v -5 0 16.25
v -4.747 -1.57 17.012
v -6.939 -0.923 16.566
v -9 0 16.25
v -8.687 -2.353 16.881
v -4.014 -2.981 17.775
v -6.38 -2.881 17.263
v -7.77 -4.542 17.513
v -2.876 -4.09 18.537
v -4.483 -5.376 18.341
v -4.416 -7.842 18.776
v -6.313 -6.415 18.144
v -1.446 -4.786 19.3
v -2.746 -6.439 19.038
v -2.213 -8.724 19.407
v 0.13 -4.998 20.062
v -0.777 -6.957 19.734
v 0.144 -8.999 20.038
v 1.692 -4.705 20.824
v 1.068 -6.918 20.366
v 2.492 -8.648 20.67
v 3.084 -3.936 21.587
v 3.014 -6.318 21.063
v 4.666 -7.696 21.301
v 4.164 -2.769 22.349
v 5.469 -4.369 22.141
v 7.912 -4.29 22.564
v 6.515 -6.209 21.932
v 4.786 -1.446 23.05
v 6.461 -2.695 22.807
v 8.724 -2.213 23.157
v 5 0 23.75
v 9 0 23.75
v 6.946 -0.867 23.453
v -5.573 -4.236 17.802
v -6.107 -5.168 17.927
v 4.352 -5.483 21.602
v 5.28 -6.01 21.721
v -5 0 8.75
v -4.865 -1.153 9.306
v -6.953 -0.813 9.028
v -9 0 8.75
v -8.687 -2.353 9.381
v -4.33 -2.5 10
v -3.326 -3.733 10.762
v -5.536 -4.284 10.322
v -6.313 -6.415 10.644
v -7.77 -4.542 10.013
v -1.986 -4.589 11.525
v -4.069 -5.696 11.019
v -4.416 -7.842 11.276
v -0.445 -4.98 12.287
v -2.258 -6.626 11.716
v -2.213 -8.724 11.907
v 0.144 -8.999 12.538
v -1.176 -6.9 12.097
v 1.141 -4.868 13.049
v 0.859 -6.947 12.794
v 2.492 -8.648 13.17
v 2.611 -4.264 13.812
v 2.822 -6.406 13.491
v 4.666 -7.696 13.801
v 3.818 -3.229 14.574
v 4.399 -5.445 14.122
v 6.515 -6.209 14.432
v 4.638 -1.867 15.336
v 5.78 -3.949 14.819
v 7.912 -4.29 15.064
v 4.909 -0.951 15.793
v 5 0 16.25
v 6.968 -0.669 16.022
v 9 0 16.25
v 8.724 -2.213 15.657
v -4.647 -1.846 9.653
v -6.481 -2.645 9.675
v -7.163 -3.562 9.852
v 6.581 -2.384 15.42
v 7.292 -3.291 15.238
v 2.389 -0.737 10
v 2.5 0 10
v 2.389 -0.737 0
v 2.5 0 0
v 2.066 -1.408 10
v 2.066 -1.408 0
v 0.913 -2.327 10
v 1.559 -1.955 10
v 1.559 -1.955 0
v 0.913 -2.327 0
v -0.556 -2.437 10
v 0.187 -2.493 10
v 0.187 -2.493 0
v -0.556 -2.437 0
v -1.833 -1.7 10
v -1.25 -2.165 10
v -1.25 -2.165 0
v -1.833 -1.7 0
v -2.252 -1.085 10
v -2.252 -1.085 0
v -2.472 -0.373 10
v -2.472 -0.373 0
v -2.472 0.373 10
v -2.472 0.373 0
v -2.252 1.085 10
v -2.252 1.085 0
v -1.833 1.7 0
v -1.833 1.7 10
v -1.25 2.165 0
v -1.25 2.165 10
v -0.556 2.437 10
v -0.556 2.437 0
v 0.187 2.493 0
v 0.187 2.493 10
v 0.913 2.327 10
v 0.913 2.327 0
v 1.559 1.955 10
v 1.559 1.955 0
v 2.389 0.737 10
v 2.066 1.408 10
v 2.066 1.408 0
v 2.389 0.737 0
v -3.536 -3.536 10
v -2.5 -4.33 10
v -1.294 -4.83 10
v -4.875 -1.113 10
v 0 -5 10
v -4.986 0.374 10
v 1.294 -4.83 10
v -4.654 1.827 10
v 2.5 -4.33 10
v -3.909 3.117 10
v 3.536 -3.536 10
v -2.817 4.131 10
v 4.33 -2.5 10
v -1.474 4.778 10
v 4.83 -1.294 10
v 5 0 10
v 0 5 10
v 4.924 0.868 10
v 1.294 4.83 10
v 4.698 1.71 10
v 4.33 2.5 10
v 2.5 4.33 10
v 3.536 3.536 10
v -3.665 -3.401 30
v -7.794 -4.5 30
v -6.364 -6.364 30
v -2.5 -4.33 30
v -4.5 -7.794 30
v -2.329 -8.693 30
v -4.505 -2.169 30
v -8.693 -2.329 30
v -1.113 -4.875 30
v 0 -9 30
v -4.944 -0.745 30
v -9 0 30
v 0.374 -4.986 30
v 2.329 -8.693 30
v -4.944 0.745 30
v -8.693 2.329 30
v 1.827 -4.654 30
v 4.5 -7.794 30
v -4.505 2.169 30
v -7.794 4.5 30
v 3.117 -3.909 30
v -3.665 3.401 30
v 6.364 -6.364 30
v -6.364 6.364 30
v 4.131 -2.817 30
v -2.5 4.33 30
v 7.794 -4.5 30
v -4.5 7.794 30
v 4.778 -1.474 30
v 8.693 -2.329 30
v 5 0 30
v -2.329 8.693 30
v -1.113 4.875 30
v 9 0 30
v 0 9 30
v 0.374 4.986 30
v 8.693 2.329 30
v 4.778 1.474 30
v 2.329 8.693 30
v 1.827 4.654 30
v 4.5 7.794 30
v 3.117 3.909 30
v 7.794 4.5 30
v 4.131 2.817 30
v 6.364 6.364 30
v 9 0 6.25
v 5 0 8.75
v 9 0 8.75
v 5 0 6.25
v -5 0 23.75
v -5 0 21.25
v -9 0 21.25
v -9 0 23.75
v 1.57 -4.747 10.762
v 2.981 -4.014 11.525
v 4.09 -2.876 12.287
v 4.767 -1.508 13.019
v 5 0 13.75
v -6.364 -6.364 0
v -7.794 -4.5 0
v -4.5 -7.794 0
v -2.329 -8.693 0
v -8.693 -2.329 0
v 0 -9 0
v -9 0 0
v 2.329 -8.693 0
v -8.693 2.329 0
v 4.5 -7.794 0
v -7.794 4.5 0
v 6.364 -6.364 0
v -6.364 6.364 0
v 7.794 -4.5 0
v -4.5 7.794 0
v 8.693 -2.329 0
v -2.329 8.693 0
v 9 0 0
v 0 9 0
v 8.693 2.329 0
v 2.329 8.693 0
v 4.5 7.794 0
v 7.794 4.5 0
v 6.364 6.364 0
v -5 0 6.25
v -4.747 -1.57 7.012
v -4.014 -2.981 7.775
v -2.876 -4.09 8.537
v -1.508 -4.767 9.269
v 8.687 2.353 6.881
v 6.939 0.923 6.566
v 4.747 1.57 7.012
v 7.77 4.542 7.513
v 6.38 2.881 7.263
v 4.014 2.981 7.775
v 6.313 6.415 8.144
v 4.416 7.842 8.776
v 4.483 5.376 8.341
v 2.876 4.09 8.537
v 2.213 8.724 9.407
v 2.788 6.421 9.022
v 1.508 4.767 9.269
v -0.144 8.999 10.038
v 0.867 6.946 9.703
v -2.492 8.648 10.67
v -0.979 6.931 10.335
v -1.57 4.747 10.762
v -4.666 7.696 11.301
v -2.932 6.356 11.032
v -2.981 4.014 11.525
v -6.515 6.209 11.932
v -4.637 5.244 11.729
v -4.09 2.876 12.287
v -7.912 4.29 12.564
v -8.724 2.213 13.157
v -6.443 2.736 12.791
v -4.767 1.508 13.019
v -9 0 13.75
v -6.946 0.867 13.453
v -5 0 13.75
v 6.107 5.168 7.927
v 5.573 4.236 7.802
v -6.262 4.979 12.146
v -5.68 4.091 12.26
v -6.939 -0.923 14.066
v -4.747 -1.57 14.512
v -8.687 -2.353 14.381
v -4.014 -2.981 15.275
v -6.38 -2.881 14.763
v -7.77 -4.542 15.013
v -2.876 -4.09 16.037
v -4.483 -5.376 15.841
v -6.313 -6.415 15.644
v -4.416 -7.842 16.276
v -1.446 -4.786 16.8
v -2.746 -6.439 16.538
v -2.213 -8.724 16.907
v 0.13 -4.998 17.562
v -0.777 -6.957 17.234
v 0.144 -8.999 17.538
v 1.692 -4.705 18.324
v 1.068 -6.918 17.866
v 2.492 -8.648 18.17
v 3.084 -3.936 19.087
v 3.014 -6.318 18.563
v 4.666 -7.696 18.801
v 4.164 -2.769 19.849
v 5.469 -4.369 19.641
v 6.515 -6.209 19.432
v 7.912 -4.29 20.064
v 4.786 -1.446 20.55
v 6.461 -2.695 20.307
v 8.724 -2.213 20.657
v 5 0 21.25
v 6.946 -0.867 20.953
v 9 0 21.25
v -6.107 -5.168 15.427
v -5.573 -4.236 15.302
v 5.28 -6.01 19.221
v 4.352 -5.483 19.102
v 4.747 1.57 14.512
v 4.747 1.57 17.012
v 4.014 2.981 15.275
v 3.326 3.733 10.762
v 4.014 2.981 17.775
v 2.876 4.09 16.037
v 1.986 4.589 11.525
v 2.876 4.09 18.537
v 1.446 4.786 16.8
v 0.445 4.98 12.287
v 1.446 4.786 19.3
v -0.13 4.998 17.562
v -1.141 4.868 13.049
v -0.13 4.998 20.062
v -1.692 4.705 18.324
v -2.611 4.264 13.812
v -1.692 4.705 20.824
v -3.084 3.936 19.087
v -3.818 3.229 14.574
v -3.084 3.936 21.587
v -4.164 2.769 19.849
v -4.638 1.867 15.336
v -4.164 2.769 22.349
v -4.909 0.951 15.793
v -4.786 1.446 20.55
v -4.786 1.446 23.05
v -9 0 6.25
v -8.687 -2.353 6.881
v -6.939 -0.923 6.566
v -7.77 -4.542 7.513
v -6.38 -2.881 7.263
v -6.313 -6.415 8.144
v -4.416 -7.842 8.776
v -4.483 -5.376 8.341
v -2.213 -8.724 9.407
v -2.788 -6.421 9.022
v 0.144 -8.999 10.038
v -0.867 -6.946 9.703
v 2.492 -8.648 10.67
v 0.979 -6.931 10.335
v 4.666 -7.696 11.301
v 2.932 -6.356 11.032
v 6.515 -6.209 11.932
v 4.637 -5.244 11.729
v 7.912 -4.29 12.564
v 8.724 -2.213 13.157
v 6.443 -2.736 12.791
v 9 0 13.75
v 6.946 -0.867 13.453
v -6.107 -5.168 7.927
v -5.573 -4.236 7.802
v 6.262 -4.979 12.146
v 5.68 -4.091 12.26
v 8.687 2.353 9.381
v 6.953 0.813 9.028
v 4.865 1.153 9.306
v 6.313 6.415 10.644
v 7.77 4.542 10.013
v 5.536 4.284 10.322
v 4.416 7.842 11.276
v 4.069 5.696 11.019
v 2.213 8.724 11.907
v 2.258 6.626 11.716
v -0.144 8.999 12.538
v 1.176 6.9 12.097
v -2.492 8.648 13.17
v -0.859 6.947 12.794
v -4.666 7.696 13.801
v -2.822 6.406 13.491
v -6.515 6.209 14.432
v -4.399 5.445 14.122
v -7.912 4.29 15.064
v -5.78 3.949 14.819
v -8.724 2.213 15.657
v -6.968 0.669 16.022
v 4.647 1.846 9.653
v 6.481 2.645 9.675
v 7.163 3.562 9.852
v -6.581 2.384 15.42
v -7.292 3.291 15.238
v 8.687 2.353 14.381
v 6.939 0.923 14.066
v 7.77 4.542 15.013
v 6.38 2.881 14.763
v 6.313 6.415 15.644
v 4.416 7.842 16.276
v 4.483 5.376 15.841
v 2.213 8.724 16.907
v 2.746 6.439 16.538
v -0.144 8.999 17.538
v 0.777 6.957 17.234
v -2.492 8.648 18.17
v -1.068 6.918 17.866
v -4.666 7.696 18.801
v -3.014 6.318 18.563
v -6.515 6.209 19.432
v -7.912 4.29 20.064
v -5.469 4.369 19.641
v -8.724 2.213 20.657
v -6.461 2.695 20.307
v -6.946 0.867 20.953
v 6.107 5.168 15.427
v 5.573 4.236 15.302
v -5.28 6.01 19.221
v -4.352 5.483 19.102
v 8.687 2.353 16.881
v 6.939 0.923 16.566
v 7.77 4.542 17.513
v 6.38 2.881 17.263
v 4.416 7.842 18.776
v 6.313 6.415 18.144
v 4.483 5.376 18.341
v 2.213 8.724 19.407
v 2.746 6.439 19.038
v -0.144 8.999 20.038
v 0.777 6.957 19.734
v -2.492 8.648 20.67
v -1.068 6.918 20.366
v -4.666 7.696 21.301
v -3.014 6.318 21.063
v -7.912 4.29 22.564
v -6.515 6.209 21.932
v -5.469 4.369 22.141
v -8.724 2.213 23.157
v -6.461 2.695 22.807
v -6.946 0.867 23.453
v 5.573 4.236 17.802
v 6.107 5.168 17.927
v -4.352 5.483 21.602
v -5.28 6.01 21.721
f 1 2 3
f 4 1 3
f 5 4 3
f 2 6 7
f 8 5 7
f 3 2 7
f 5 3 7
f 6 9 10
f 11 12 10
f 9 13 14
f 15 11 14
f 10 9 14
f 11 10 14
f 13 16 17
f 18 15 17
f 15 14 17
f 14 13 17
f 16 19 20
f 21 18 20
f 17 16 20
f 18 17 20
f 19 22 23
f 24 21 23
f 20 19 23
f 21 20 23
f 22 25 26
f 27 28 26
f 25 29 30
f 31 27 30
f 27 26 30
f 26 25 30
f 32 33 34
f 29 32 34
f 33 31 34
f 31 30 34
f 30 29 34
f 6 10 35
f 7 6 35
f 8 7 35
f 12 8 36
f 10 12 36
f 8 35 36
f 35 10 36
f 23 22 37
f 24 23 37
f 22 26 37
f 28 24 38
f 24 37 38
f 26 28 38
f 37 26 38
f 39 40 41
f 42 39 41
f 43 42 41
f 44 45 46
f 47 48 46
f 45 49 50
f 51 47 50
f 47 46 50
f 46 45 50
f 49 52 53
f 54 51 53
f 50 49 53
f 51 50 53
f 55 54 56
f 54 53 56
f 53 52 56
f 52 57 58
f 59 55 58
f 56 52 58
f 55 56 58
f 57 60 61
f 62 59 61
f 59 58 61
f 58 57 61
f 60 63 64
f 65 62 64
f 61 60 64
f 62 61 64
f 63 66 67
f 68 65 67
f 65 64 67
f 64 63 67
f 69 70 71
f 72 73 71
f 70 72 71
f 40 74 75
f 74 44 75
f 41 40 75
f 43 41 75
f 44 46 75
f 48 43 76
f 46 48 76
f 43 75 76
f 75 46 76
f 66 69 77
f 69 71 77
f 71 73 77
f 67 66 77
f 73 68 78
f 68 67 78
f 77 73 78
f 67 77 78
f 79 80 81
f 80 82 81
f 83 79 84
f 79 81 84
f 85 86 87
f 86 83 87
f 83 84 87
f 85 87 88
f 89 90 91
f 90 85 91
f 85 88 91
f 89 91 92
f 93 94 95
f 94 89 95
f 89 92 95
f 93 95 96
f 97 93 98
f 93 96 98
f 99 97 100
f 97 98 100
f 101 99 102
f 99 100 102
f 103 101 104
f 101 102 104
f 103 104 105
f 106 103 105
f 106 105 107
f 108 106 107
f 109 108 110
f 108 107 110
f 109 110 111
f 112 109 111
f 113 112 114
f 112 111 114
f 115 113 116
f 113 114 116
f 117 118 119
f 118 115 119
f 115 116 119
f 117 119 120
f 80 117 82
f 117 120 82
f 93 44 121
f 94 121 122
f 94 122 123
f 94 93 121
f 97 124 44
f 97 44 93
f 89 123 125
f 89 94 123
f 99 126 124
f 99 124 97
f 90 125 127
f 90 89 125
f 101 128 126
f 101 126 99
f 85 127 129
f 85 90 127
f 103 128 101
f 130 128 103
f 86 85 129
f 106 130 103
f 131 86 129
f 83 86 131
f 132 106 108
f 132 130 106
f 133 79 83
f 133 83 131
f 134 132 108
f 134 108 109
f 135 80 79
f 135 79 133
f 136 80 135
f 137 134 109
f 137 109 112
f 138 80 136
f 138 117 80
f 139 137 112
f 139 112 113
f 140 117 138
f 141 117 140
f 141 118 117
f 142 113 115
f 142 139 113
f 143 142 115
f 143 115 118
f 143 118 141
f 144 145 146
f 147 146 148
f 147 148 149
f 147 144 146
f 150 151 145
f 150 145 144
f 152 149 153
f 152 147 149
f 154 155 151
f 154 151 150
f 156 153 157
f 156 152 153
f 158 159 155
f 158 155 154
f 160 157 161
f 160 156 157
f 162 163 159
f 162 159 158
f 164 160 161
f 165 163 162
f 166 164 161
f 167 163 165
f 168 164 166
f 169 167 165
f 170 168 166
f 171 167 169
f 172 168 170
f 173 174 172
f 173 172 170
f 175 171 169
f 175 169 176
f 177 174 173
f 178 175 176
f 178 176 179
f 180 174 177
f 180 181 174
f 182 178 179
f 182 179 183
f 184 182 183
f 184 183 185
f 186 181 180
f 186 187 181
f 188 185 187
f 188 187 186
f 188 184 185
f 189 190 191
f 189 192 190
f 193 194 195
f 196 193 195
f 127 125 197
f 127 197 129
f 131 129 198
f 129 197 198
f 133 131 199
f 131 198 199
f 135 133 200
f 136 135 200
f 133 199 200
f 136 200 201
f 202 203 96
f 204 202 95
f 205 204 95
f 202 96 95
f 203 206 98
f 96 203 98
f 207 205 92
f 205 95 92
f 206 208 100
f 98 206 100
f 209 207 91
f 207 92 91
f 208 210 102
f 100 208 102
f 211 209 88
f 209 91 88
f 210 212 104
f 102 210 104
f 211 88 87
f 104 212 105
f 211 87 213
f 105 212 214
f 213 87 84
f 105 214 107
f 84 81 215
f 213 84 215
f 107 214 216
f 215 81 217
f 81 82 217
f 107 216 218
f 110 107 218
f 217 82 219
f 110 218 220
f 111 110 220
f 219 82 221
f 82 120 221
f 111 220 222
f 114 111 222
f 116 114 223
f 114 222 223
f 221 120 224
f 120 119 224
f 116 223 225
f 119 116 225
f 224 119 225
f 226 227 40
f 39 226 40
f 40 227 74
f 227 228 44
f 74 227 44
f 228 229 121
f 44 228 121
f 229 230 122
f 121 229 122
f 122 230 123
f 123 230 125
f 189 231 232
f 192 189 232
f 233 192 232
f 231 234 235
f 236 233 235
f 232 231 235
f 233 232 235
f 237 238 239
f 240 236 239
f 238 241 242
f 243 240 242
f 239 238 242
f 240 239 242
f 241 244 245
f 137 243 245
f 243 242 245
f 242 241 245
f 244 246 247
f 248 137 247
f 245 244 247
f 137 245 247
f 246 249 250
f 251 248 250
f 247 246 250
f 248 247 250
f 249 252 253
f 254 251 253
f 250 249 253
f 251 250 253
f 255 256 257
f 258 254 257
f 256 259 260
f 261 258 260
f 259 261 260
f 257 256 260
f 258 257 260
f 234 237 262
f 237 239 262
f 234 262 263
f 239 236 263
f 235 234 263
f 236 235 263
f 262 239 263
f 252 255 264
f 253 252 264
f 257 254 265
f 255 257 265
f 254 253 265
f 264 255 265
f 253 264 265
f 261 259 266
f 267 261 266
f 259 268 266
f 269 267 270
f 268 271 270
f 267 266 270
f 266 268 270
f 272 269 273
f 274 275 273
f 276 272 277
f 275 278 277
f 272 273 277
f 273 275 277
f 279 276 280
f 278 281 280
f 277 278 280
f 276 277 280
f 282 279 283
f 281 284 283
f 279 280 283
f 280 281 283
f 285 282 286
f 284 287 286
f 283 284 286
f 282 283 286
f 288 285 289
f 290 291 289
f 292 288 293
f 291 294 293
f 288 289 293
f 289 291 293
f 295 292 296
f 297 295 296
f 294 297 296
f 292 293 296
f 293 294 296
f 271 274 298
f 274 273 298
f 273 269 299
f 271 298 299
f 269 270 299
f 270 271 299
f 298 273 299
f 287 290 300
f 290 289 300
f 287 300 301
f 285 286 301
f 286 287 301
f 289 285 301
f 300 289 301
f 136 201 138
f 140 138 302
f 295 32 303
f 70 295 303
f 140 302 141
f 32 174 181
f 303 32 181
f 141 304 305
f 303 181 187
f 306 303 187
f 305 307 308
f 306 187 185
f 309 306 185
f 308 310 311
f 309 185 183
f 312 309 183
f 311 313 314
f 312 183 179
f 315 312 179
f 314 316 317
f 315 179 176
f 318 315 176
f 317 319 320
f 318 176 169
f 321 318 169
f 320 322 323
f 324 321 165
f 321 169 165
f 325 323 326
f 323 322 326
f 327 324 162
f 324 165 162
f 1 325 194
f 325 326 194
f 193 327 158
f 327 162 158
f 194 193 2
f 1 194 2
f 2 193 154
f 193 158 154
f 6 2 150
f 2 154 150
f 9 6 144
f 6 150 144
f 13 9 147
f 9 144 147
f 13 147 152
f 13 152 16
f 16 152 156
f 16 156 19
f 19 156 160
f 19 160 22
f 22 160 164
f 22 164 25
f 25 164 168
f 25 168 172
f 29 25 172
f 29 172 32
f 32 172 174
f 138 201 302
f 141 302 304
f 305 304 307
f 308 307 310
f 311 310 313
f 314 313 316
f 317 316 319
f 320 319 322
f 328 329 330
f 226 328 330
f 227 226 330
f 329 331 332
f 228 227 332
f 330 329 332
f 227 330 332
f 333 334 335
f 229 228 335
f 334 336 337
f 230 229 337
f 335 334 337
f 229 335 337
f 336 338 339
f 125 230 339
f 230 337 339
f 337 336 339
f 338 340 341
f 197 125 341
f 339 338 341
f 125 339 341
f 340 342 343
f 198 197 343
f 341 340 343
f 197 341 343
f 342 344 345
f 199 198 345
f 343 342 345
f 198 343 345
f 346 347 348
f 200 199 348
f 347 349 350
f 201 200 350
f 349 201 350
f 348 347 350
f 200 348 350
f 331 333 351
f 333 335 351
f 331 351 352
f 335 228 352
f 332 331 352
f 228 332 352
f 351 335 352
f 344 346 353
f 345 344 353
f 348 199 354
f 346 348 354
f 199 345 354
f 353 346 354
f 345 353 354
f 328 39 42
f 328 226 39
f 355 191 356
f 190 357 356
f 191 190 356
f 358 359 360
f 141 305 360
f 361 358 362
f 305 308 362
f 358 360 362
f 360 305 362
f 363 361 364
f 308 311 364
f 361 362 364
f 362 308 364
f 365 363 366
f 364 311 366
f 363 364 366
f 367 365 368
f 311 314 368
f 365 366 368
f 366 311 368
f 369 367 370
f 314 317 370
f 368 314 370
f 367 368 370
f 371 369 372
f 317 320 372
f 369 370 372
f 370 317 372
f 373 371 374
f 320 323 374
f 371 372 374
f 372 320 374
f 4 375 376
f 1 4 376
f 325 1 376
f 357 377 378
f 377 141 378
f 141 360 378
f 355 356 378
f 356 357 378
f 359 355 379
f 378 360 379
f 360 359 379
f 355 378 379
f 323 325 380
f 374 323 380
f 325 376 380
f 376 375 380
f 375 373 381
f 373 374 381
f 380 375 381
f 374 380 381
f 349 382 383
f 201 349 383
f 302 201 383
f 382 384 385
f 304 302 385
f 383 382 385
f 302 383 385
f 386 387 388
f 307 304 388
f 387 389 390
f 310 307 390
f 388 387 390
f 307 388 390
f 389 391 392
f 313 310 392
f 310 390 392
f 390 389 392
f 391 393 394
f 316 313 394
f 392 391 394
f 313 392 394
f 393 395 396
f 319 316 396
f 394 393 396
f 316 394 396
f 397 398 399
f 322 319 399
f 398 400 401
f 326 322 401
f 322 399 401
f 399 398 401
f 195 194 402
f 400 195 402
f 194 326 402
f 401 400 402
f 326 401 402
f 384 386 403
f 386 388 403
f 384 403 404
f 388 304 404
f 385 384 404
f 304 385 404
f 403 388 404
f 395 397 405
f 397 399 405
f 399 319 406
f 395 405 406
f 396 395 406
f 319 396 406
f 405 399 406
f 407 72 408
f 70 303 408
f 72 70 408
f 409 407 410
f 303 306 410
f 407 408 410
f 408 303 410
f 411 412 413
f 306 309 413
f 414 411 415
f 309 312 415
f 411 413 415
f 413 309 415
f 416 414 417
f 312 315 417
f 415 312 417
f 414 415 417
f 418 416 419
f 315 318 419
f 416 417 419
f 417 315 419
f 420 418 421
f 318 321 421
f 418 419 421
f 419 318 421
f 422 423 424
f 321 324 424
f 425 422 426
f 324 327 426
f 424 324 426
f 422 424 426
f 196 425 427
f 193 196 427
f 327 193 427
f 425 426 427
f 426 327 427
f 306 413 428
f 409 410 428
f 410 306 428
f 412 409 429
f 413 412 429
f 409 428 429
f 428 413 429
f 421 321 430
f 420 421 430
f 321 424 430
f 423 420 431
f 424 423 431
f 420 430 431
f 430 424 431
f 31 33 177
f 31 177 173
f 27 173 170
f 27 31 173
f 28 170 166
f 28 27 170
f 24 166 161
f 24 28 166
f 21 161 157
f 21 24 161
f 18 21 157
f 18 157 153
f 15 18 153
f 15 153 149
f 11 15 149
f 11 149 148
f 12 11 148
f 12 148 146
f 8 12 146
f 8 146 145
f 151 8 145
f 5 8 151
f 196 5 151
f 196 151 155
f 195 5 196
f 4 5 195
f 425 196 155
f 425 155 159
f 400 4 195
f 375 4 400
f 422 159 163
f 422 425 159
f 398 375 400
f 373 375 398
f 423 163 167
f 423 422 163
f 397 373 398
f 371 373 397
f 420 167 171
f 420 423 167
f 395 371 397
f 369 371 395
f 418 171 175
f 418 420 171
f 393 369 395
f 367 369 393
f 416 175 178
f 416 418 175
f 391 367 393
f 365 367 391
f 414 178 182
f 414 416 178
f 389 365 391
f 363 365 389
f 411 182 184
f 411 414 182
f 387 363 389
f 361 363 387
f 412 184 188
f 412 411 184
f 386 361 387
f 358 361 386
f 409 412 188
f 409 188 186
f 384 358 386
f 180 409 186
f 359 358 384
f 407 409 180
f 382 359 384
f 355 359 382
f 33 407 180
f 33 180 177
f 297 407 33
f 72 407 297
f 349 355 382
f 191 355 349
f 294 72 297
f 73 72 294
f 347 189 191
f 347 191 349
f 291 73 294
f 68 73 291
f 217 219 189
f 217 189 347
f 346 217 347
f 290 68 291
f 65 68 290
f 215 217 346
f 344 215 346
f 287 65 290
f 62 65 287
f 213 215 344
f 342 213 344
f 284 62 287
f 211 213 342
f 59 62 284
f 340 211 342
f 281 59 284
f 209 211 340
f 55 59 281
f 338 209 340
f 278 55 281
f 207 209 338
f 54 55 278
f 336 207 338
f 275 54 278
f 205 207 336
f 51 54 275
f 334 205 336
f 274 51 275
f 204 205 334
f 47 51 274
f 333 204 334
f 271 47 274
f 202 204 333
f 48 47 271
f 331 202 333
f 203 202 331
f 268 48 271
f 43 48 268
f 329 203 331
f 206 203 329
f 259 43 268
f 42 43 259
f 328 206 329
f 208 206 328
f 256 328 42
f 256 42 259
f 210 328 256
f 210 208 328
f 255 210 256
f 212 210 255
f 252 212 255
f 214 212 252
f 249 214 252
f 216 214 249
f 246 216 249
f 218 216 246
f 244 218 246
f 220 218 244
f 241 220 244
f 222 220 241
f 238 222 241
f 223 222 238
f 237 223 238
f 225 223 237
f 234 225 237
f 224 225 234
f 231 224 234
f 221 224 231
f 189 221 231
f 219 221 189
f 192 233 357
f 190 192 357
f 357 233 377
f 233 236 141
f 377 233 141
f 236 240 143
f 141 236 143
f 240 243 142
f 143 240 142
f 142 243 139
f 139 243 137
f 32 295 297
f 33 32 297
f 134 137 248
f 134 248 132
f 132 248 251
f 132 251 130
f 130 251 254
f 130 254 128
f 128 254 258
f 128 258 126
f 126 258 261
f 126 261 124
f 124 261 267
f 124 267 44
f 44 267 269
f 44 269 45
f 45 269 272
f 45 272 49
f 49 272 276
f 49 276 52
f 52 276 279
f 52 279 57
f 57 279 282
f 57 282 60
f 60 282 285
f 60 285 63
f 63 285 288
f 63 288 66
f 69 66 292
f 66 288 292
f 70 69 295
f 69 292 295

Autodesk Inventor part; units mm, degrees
ref_plane "YZ Plane" through (0, 0, 0) normal (1, 0, 0) x (0, 1, 0)
ref_plane "XZ Plane" through (0, 0, 0) normal (0, 1, 0) x (-1, 0, 0)
ref_plane "XY Plane" through (0, 0, 0) normal (0, 0, 1) x (1, 0, 0)
sketch "Sketch1" plane through (0, 0, 0) normal (0, 0, 1) x (1, 0, 0)
  circle A0 centre (0, 0) radius 9
  circle A1 centre (0, 0) radius 2.5
  dimension "d0" = 18
  dimension "d3" = 5
extrude "Extrusion1" add sketch "Sketch1" along normal blind 30
sketch "Sketch2" plane through (0, 0, 30) normal (0, 0, 1) x (1, 0, 0)
  circle A0 centre (0, 0) radius 2.5 projected
  circle A1 centre (0, 0) radius 9 projected
  circle A2 centre (0, 0) radius 5
  dimension "d4" = 10
extrude "Extrusion2" cut sketch "Sketch2" against normal blind 20 contours A2
sketch "Sketch3" plane through (0, 0, 0) normal (0, 1, 0) x (-1, 0, 0)
  line L0 (9, 30) -> (9, 0) projected
  line L1 (9, 0) -> (2.5, 0) projected
  line L2 (2.5, 0) -> (2.5, 10) projected
  line L3 (2.5, 10) -> (5, 10) projected
  line L4 (5, 10) -> (5, 30) projected
  line L5 (5, 30) -> (9, 30) projected
  line L6 (-9, 0) -> (-9, 30) projected
  line L7 (-9, 30) -> (-5, 30) projected
  line L8 (-5, 30) -> (-5, 10) projected
  line L9 (-5, 10) -> (-2.5, 10) projected
  line L10 (-2.5, 10) -> (-2.5, 0) projected
  line L11 (-2.5, 0) -> (-9, 0) projected
  line L12 (0, 0) -> (9, 0)
  line L13 (9, 0) -> (9, 30)
  line L14 (9, 30) -> (0, 30)
  line L15 (0, 30) -> (0, 0)
  line L16 (-9, 6.25) -> (-5, 6.25)
  line L17 (-5, 6.25) -> (-5, 8.75)
  line L18 (-5, 8.75) -> (-9, 8.75)
  line L19 (-9, 8.75) -> (-9, 6.25)
  line L20 (-9, 15) -> (0, 15) construction
  line L21 (-9, 7.5) -> (-5, 7.5) construction
  dimension "d20" = 2.5
  dimension "d22" = 7.5
extrude "Extrusion3" [suppressed]
coil "Coil1" sketch "Sketch3" operation cut axis through (0, 0, -10) along (0, 0, 1) pitch 15 turns 1 hand right contours L6 L18 L17 L16
pattern_circular "Circular Pattern1" count 2 over 360 about axis through (0, 0, -10) along (0, 0, 1) of "Coil1"
properties part number "z-coupler"
